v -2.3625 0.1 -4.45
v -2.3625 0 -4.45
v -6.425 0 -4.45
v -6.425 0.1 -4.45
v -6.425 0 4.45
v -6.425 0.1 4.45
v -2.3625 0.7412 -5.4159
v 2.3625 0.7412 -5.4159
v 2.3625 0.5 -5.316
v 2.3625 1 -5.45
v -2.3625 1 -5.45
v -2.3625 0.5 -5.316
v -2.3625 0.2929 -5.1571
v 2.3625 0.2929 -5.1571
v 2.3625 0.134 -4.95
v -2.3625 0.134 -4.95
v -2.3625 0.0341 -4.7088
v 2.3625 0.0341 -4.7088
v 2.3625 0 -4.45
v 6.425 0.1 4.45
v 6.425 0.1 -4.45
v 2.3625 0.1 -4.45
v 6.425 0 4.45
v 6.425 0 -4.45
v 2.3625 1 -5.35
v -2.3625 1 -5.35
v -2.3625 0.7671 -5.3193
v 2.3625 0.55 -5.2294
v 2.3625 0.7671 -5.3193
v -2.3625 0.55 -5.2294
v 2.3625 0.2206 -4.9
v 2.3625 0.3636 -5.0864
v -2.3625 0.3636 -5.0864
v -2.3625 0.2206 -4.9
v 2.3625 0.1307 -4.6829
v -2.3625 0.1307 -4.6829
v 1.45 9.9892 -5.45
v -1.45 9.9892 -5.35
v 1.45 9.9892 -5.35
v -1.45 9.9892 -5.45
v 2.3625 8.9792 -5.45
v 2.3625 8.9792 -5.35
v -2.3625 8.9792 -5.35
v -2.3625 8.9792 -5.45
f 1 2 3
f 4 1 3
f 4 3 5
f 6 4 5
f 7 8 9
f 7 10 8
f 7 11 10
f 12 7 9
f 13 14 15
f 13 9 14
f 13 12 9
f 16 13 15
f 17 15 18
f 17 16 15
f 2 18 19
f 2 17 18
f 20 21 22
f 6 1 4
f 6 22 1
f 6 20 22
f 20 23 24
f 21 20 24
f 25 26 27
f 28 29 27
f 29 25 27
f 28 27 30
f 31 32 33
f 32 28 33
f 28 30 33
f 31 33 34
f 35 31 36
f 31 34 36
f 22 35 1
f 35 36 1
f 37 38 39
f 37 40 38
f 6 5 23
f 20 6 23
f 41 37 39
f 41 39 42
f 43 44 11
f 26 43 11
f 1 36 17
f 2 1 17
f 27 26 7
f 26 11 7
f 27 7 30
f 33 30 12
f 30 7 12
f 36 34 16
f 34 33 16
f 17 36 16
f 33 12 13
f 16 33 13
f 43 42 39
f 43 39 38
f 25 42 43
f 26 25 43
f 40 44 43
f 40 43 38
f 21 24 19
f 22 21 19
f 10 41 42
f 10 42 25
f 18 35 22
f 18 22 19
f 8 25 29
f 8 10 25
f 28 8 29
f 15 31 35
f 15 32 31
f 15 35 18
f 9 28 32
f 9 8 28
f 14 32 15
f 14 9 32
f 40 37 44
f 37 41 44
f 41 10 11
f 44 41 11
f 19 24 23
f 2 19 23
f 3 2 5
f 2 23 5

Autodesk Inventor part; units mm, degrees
ref_plane "YZ Plane" through (0, 0, 0) normal (1, 0, 0) x (0, 1, 0)
ref_plane "XZ Plane" through (0, 0, 0) normal (0, 1, 0) x (-1, 0, 0)
ref_plane "XY Plane" through (0, 0, 0) normal (0, 0, 1) x (1, 0, 0)
sketch "Sketch1" plane through (0, 0, 0) normal (0, 1, 0) x (-1, 0, 0)
  line L0 (-6.425, -4.45) -> (6.425, -4.45)
  line L1 (6.425, -4.45) -> (6.425, 4.45)
  line L2 (6.425, 4.45) -> (-6.425, 4.45)
  line L3 (-6.425, 4.45) -> (-6.425, -4.45)
  line L4 (-6.425, -4.45) -> (6.425, 4.45) construction
  line L5 (6.425, -4.45) -> (-6.425, 4.45) construction
  line L6 (-2.3625, -4.45) -> (2.3625, -4.45)
  line L7 (2.3625, -4.45) -> (2.3625, -14)
  line L8 (-2.3625, -14) -> (-2.3625, -4.45)
  line L9 (1.45, -15.01) -> (-1.45, -15.01)
  line L10 (2.3625, -14) -> (1.45, -15.01)
  line L11 (-1.45, -15.01) -> (-2.3625, -14)
extrude "Extrusion1" add sketch "Sketch1" along normal blind 0.1
sketch "Sketch2" plane through (0, 0, 0) normal (0, -1, 0) x (1, 0, 0)
  line L0 (-2.3625, -4.45) -> (2.3625, -4.45)
  line L1 (-2.3625, -5.45) -> (2.3625, -5.45)
  point P0 (0, 0)
  dimension "d2" = 1
bend part "Bend Part1" radius 1 angle 90 line through (-2.3625, 0, -4.45) along (1, 0, 0) centre toward (0, 1, 0) moving side (0, 0, -1) both sides no
properties part number "ECoG64Ch"
